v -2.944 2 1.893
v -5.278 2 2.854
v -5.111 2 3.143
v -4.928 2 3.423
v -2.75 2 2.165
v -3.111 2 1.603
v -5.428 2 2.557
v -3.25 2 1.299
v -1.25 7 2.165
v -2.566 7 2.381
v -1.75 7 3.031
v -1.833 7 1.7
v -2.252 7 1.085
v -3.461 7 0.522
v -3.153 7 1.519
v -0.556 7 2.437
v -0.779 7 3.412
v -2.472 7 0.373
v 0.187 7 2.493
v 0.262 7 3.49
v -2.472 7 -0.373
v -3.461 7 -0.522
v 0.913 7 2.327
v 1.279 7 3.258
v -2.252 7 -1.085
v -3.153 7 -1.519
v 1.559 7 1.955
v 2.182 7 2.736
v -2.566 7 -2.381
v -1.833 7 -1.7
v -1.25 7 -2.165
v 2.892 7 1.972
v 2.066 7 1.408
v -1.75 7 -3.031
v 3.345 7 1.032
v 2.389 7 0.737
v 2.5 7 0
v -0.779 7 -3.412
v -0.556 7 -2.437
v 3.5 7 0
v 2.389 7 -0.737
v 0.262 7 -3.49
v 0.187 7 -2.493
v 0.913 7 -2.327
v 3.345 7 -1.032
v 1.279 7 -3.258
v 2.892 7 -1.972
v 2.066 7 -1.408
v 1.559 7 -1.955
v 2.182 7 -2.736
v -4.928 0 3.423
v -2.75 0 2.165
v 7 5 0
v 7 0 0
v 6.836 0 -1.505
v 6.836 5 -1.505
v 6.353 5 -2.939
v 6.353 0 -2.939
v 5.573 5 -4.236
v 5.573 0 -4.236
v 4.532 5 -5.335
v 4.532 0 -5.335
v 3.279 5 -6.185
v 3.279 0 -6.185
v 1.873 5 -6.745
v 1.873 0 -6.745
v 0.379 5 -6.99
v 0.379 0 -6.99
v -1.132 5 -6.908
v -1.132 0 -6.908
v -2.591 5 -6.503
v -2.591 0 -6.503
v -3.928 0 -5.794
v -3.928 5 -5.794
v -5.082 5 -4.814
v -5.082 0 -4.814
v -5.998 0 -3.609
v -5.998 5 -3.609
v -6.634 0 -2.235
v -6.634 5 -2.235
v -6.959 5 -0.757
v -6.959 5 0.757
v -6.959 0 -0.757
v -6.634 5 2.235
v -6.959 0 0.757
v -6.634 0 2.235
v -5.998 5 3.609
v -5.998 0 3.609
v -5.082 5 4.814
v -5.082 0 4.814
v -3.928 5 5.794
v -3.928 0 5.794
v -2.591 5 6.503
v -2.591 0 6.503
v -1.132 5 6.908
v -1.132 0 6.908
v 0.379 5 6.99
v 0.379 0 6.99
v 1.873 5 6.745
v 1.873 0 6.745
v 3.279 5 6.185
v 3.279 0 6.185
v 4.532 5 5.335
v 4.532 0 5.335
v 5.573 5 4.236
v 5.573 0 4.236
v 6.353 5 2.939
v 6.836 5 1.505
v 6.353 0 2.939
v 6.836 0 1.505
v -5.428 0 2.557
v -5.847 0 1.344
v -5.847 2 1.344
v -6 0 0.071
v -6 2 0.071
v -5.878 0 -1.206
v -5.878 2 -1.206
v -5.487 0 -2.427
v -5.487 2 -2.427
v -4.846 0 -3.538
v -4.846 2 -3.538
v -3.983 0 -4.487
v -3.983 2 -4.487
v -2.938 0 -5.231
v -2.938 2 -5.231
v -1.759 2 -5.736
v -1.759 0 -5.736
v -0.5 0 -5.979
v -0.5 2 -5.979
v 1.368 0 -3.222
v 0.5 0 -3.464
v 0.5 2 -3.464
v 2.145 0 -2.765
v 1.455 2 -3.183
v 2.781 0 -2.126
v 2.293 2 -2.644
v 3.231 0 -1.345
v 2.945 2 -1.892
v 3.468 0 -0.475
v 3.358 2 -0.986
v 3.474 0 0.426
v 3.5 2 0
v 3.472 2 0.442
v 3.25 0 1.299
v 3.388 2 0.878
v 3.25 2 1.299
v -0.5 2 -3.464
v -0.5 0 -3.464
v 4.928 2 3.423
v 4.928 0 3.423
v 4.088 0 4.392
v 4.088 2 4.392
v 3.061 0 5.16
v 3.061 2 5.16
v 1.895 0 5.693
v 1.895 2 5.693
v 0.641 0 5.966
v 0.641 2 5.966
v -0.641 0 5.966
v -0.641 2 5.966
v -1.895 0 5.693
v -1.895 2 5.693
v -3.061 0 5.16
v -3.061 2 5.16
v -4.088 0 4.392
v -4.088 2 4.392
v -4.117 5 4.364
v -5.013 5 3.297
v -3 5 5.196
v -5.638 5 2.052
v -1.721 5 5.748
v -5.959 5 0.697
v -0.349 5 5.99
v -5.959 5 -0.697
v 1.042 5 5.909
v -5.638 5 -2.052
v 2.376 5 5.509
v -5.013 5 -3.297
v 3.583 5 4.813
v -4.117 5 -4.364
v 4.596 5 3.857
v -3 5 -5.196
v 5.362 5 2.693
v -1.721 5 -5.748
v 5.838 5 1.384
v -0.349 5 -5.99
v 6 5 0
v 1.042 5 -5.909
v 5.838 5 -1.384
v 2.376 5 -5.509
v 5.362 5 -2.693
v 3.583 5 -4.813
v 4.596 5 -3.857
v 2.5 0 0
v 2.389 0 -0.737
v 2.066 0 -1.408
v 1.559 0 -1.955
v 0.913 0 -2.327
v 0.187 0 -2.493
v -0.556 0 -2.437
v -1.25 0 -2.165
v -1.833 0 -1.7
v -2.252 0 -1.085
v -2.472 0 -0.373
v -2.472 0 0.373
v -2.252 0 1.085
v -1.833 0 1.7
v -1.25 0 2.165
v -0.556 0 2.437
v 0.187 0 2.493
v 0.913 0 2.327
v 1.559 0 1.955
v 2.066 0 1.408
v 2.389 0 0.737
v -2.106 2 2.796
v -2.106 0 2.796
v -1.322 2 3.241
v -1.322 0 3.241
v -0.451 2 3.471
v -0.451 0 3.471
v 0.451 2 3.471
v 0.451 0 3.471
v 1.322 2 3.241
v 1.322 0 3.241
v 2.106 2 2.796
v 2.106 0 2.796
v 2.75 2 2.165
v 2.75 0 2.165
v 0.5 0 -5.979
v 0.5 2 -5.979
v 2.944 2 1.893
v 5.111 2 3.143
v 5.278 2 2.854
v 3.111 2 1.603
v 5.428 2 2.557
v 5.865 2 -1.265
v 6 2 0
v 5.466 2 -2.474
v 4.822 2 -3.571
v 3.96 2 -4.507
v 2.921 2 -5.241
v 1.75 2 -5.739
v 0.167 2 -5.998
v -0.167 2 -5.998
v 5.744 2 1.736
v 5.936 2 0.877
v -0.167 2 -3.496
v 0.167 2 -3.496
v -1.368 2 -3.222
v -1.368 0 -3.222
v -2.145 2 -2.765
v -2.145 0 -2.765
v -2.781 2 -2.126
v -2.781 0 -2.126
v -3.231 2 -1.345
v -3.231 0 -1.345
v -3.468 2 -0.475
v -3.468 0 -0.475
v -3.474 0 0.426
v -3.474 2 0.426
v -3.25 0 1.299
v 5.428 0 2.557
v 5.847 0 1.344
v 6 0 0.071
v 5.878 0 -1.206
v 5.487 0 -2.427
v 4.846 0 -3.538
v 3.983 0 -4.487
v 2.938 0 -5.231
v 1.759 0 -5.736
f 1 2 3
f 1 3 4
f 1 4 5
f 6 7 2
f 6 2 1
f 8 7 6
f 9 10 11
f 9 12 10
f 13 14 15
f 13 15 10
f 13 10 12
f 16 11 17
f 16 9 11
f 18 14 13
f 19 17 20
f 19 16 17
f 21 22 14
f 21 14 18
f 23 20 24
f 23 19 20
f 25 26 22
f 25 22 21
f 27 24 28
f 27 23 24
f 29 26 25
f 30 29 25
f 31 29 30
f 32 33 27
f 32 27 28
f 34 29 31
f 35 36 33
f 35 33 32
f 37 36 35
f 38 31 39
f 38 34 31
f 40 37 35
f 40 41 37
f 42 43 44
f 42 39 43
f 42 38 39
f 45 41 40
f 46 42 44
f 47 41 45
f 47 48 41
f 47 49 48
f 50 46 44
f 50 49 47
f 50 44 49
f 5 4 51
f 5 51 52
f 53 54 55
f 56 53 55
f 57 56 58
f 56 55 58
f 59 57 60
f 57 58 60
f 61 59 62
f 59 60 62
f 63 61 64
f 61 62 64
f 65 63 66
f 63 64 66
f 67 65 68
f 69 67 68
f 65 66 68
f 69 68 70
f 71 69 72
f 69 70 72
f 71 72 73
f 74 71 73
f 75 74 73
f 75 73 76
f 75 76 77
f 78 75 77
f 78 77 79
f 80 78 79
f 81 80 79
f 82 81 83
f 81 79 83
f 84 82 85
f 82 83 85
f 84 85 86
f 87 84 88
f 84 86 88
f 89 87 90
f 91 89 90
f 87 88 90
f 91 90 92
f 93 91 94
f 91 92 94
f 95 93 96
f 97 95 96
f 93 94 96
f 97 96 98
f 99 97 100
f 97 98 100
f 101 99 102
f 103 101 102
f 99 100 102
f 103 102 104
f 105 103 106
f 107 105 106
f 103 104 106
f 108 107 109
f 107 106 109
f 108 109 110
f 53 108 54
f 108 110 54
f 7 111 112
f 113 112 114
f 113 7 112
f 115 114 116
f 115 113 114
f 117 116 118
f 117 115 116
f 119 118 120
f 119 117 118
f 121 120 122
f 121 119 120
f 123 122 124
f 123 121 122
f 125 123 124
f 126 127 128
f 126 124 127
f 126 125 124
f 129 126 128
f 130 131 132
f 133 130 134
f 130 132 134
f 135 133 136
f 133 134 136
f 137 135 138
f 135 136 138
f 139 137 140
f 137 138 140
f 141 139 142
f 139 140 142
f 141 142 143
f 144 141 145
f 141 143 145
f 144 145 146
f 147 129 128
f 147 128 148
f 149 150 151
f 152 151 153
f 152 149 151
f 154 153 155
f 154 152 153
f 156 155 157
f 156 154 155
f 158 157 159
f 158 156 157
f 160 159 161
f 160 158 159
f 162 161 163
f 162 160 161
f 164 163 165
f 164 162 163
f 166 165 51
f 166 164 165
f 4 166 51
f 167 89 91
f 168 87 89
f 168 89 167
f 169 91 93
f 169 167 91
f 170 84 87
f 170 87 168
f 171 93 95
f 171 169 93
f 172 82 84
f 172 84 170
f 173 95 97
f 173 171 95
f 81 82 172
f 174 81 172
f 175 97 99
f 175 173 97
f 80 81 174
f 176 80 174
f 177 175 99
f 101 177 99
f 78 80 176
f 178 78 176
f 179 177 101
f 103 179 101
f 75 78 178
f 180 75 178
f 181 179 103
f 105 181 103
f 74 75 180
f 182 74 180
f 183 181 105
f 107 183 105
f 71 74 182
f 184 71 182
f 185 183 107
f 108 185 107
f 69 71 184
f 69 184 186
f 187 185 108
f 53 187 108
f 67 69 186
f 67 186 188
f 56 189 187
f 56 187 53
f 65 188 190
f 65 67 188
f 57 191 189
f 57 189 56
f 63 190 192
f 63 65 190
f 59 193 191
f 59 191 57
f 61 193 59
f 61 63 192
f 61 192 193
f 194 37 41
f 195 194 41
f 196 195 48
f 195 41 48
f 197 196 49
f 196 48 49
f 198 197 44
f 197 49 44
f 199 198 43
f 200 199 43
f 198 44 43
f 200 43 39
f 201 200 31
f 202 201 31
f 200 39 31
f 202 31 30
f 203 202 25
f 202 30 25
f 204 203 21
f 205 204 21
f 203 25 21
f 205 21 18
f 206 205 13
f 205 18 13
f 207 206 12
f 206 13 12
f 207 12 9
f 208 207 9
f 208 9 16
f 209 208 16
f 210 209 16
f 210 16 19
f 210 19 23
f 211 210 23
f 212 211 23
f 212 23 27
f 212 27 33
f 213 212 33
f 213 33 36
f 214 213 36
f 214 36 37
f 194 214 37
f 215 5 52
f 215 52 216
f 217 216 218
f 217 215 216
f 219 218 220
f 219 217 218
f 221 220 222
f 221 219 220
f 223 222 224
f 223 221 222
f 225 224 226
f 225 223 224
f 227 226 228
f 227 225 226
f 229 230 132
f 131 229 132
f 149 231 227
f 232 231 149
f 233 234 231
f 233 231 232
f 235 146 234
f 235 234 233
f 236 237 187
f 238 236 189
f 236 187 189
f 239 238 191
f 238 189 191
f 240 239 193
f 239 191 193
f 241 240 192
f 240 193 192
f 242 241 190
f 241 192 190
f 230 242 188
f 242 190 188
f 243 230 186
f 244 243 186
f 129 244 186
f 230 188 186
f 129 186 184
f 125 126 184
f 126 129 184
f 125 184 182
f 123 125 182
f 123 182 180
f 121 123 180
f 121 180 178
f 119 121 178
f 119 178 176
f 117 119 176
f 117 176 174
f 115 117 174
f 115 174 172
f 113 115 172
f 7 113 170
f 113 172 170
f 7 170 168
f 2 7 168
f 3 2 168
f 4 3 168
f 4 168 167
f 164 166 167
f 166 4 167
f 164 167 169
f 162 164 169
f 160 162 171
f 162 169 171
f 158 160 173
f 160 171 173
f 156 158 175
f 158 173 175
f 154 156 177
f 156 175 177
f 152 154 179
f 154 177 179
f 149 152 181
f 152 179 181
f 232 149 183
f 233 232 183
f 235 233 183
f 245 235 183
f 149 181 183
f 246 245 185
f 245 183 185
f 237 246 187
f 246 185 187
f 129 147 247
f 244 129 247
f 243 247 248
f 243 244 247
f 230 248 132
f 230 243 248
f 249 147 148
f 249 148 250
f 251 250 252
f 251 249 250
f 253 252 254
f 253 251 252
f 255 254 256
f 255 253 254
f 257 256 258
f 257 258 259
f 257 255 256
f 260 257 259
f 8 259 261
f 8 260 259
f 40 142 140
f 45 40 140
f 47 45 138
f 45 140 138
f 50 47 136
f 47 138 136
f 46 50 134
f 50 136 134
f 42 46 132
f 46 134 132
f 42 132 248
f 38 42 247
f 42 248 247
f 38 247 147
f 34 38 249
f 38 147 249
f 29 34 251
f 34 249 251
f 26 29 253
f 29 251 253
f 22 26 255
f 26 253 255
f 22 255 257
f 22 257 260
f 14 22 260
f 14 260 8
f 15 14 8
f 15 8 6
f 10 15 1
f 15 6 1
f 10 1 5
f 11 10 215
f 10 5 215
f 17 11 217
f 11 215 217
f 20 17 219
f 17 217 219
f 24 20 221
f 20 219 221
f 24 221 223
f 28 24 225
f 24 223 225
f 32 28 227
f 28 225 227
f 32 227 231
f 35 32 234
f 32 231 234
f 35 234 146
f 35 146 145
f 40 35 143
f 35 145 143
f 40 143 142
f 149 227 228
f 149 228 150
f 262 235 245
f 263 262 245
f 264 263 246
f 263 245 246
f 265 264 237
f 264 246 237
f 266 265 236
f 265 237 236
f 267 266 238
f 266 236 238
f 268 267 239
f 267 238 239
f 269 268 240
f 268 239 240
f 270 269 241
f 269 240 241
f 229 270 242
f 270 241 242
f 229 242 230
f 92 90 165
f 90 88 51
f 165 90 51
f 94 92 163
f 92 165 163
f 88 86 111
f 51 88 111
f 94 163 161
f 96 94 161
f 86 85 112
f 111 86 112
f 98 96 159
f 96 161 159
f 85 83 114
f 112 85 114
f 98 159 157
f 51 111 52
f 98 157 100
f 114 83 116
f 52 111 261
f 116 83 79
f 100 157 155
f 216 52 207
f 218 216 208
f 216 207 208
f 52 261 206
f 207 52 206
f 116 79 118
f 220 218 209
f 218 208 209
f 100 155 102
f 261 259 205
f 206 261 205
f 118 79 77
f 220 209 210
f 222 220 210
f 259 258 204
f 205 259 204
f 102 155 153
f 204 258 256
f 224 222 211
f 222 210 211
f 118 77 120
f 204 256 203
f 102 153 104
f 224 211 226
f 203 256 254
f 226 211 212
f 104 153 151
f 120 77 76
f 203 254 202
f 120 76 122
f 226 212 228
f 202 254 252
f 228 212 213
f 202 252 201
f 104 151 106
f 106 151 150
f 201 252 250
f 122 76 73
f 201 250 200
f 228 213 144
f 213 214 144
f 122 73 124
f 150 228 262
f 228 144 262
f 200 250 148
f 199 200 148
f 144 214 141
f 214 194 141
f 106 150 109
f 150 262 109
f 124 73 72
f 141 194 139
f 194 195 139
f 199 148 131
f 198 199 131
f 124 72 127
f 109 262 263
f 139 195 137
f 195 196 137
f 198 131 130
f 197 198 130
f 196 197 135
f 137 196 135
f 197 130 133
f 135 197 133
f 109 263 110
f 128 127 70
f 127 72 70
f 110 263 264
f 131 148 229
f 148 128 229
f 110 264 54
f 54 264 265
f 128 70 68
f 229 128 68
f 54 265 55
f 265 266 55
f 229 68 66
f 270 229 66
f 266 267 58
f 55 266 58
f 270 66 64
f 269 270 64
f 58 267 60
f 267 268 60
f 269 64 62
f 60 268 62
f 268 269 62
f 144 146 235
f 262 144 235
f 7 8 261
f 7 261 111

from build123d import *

# Parameters (mm, degrees)
SKETCH1_R           = 7
BOSS_EXTRUDE1_DEPTH = 5
SKETCH2_R           = 6
CUT_EXTRUDE1_DEPTH  = 3
SKETCH3_R           = 3.5
BOSS_EXTRUDE3_DEPTH = 5
SKETCH4_R           = 2.5
CUT_EXTRUDE2_DEPTH  = 8
CUT_EXTRUDE3_DEPTH  = 3


with BuildPart() as part:
    # Sketch1 → Boss-Extrude1 (new body)
    with BuildSketch(Plane(origin=(0, 0, 0), x_dir=(1, 0, 0), z_dir=(0, 1, 0))):
        Circle(SKETCH1_R)
    extrude(amount=BOSS_EXTRUDE1_DEPTH)

    # Sketch2 → Cut-Extrude1 (cut)
    with BuildSketch(Plane(origin=(0, 5, 0), x_dir=(1, 0, 0), z_dir=(0, 1, 0))):
        Circle(SKETCH2_R)
    extrude(amount=-CUT_EXTRUDE1_DEPTH, mode=Mode.SUBTRACT)

    # Sketch3 → Boss-Extrude3 (add)
    with BuildSketch(Plane(origin=(0, 2, 0), x_dir=(1, 0, 0), z_dir=(0, 1, 0))):
        Circle(SKETCH3_R)
    extrude(amount=BOSS_EXTRUDE3_DEPTH)

    # Sketch4 → Cut-Extrude2 (cut, through all)
    with BuildSketch(Plane(origin=(0, 7, 0), x_dir=(1, 0, 0), z_dir=(0, 1, 0))):
        Circle(SKETCH4_R)
    extrude(amount=-CUT_EXTRUDE2_DEPTH, mode=Mode.SUBTRACT)

    # Sketch5 → Cut-Extrude3 (cut, through all)
    with BuildSketch(Plane(origin=(0, 2, 0), x_dir=(1, 0, 0), z_dir=(0, 1, 0))):
        with BuildLine():
            Line((-0.5, 5.979130372), (-0.5, 3.464101615))
            ThreePointArc((-0.5, 3.464101615), (-3.031088913, 1.75), (-3.25, -1.299038106))
            Line((-3.25, -1.299038106), (-5.428078794, -2.556552484))
            ThreePointArc((-5.428078794, -2.556552484), (-5.196152423, 3), (-0.5, 5.979130372))
        make_face()
        with BuildLine():
            Line((0.5, 5.979130372), (0.5, 3.464101615))
            ThreePointArc((0.5, 3.464101615), (3.031088913, 1.75), (3.25, -1.299038106))
            Line((3.25, -1.299038106), (5.428078794, -2.556552484))
            ThreePointArc((5.428078794, -2.556552484), (5.196152423, 3), (0.5, 5.979130372))
        make_face()
        with BuildLine():
            Line((-4.928078794, -3.422577888), (-2.75, -2.165063509))
            ThreePointArc((-2.75, -2.165063509), (0, -3.5), (2.75, -2.165063509))
            Line((2.75, -2.165063509), (4.928078794, -3.422577888))
            ThreePointArc((4.928078794, -3.422577888), (0, -6), (-4.928078794, -3.422577888))
        make_face()
    extrude(amount=-CUT_EXTRUDE3_DEPTH, mode=Mode.SUBTRACT)


solid = part.part
